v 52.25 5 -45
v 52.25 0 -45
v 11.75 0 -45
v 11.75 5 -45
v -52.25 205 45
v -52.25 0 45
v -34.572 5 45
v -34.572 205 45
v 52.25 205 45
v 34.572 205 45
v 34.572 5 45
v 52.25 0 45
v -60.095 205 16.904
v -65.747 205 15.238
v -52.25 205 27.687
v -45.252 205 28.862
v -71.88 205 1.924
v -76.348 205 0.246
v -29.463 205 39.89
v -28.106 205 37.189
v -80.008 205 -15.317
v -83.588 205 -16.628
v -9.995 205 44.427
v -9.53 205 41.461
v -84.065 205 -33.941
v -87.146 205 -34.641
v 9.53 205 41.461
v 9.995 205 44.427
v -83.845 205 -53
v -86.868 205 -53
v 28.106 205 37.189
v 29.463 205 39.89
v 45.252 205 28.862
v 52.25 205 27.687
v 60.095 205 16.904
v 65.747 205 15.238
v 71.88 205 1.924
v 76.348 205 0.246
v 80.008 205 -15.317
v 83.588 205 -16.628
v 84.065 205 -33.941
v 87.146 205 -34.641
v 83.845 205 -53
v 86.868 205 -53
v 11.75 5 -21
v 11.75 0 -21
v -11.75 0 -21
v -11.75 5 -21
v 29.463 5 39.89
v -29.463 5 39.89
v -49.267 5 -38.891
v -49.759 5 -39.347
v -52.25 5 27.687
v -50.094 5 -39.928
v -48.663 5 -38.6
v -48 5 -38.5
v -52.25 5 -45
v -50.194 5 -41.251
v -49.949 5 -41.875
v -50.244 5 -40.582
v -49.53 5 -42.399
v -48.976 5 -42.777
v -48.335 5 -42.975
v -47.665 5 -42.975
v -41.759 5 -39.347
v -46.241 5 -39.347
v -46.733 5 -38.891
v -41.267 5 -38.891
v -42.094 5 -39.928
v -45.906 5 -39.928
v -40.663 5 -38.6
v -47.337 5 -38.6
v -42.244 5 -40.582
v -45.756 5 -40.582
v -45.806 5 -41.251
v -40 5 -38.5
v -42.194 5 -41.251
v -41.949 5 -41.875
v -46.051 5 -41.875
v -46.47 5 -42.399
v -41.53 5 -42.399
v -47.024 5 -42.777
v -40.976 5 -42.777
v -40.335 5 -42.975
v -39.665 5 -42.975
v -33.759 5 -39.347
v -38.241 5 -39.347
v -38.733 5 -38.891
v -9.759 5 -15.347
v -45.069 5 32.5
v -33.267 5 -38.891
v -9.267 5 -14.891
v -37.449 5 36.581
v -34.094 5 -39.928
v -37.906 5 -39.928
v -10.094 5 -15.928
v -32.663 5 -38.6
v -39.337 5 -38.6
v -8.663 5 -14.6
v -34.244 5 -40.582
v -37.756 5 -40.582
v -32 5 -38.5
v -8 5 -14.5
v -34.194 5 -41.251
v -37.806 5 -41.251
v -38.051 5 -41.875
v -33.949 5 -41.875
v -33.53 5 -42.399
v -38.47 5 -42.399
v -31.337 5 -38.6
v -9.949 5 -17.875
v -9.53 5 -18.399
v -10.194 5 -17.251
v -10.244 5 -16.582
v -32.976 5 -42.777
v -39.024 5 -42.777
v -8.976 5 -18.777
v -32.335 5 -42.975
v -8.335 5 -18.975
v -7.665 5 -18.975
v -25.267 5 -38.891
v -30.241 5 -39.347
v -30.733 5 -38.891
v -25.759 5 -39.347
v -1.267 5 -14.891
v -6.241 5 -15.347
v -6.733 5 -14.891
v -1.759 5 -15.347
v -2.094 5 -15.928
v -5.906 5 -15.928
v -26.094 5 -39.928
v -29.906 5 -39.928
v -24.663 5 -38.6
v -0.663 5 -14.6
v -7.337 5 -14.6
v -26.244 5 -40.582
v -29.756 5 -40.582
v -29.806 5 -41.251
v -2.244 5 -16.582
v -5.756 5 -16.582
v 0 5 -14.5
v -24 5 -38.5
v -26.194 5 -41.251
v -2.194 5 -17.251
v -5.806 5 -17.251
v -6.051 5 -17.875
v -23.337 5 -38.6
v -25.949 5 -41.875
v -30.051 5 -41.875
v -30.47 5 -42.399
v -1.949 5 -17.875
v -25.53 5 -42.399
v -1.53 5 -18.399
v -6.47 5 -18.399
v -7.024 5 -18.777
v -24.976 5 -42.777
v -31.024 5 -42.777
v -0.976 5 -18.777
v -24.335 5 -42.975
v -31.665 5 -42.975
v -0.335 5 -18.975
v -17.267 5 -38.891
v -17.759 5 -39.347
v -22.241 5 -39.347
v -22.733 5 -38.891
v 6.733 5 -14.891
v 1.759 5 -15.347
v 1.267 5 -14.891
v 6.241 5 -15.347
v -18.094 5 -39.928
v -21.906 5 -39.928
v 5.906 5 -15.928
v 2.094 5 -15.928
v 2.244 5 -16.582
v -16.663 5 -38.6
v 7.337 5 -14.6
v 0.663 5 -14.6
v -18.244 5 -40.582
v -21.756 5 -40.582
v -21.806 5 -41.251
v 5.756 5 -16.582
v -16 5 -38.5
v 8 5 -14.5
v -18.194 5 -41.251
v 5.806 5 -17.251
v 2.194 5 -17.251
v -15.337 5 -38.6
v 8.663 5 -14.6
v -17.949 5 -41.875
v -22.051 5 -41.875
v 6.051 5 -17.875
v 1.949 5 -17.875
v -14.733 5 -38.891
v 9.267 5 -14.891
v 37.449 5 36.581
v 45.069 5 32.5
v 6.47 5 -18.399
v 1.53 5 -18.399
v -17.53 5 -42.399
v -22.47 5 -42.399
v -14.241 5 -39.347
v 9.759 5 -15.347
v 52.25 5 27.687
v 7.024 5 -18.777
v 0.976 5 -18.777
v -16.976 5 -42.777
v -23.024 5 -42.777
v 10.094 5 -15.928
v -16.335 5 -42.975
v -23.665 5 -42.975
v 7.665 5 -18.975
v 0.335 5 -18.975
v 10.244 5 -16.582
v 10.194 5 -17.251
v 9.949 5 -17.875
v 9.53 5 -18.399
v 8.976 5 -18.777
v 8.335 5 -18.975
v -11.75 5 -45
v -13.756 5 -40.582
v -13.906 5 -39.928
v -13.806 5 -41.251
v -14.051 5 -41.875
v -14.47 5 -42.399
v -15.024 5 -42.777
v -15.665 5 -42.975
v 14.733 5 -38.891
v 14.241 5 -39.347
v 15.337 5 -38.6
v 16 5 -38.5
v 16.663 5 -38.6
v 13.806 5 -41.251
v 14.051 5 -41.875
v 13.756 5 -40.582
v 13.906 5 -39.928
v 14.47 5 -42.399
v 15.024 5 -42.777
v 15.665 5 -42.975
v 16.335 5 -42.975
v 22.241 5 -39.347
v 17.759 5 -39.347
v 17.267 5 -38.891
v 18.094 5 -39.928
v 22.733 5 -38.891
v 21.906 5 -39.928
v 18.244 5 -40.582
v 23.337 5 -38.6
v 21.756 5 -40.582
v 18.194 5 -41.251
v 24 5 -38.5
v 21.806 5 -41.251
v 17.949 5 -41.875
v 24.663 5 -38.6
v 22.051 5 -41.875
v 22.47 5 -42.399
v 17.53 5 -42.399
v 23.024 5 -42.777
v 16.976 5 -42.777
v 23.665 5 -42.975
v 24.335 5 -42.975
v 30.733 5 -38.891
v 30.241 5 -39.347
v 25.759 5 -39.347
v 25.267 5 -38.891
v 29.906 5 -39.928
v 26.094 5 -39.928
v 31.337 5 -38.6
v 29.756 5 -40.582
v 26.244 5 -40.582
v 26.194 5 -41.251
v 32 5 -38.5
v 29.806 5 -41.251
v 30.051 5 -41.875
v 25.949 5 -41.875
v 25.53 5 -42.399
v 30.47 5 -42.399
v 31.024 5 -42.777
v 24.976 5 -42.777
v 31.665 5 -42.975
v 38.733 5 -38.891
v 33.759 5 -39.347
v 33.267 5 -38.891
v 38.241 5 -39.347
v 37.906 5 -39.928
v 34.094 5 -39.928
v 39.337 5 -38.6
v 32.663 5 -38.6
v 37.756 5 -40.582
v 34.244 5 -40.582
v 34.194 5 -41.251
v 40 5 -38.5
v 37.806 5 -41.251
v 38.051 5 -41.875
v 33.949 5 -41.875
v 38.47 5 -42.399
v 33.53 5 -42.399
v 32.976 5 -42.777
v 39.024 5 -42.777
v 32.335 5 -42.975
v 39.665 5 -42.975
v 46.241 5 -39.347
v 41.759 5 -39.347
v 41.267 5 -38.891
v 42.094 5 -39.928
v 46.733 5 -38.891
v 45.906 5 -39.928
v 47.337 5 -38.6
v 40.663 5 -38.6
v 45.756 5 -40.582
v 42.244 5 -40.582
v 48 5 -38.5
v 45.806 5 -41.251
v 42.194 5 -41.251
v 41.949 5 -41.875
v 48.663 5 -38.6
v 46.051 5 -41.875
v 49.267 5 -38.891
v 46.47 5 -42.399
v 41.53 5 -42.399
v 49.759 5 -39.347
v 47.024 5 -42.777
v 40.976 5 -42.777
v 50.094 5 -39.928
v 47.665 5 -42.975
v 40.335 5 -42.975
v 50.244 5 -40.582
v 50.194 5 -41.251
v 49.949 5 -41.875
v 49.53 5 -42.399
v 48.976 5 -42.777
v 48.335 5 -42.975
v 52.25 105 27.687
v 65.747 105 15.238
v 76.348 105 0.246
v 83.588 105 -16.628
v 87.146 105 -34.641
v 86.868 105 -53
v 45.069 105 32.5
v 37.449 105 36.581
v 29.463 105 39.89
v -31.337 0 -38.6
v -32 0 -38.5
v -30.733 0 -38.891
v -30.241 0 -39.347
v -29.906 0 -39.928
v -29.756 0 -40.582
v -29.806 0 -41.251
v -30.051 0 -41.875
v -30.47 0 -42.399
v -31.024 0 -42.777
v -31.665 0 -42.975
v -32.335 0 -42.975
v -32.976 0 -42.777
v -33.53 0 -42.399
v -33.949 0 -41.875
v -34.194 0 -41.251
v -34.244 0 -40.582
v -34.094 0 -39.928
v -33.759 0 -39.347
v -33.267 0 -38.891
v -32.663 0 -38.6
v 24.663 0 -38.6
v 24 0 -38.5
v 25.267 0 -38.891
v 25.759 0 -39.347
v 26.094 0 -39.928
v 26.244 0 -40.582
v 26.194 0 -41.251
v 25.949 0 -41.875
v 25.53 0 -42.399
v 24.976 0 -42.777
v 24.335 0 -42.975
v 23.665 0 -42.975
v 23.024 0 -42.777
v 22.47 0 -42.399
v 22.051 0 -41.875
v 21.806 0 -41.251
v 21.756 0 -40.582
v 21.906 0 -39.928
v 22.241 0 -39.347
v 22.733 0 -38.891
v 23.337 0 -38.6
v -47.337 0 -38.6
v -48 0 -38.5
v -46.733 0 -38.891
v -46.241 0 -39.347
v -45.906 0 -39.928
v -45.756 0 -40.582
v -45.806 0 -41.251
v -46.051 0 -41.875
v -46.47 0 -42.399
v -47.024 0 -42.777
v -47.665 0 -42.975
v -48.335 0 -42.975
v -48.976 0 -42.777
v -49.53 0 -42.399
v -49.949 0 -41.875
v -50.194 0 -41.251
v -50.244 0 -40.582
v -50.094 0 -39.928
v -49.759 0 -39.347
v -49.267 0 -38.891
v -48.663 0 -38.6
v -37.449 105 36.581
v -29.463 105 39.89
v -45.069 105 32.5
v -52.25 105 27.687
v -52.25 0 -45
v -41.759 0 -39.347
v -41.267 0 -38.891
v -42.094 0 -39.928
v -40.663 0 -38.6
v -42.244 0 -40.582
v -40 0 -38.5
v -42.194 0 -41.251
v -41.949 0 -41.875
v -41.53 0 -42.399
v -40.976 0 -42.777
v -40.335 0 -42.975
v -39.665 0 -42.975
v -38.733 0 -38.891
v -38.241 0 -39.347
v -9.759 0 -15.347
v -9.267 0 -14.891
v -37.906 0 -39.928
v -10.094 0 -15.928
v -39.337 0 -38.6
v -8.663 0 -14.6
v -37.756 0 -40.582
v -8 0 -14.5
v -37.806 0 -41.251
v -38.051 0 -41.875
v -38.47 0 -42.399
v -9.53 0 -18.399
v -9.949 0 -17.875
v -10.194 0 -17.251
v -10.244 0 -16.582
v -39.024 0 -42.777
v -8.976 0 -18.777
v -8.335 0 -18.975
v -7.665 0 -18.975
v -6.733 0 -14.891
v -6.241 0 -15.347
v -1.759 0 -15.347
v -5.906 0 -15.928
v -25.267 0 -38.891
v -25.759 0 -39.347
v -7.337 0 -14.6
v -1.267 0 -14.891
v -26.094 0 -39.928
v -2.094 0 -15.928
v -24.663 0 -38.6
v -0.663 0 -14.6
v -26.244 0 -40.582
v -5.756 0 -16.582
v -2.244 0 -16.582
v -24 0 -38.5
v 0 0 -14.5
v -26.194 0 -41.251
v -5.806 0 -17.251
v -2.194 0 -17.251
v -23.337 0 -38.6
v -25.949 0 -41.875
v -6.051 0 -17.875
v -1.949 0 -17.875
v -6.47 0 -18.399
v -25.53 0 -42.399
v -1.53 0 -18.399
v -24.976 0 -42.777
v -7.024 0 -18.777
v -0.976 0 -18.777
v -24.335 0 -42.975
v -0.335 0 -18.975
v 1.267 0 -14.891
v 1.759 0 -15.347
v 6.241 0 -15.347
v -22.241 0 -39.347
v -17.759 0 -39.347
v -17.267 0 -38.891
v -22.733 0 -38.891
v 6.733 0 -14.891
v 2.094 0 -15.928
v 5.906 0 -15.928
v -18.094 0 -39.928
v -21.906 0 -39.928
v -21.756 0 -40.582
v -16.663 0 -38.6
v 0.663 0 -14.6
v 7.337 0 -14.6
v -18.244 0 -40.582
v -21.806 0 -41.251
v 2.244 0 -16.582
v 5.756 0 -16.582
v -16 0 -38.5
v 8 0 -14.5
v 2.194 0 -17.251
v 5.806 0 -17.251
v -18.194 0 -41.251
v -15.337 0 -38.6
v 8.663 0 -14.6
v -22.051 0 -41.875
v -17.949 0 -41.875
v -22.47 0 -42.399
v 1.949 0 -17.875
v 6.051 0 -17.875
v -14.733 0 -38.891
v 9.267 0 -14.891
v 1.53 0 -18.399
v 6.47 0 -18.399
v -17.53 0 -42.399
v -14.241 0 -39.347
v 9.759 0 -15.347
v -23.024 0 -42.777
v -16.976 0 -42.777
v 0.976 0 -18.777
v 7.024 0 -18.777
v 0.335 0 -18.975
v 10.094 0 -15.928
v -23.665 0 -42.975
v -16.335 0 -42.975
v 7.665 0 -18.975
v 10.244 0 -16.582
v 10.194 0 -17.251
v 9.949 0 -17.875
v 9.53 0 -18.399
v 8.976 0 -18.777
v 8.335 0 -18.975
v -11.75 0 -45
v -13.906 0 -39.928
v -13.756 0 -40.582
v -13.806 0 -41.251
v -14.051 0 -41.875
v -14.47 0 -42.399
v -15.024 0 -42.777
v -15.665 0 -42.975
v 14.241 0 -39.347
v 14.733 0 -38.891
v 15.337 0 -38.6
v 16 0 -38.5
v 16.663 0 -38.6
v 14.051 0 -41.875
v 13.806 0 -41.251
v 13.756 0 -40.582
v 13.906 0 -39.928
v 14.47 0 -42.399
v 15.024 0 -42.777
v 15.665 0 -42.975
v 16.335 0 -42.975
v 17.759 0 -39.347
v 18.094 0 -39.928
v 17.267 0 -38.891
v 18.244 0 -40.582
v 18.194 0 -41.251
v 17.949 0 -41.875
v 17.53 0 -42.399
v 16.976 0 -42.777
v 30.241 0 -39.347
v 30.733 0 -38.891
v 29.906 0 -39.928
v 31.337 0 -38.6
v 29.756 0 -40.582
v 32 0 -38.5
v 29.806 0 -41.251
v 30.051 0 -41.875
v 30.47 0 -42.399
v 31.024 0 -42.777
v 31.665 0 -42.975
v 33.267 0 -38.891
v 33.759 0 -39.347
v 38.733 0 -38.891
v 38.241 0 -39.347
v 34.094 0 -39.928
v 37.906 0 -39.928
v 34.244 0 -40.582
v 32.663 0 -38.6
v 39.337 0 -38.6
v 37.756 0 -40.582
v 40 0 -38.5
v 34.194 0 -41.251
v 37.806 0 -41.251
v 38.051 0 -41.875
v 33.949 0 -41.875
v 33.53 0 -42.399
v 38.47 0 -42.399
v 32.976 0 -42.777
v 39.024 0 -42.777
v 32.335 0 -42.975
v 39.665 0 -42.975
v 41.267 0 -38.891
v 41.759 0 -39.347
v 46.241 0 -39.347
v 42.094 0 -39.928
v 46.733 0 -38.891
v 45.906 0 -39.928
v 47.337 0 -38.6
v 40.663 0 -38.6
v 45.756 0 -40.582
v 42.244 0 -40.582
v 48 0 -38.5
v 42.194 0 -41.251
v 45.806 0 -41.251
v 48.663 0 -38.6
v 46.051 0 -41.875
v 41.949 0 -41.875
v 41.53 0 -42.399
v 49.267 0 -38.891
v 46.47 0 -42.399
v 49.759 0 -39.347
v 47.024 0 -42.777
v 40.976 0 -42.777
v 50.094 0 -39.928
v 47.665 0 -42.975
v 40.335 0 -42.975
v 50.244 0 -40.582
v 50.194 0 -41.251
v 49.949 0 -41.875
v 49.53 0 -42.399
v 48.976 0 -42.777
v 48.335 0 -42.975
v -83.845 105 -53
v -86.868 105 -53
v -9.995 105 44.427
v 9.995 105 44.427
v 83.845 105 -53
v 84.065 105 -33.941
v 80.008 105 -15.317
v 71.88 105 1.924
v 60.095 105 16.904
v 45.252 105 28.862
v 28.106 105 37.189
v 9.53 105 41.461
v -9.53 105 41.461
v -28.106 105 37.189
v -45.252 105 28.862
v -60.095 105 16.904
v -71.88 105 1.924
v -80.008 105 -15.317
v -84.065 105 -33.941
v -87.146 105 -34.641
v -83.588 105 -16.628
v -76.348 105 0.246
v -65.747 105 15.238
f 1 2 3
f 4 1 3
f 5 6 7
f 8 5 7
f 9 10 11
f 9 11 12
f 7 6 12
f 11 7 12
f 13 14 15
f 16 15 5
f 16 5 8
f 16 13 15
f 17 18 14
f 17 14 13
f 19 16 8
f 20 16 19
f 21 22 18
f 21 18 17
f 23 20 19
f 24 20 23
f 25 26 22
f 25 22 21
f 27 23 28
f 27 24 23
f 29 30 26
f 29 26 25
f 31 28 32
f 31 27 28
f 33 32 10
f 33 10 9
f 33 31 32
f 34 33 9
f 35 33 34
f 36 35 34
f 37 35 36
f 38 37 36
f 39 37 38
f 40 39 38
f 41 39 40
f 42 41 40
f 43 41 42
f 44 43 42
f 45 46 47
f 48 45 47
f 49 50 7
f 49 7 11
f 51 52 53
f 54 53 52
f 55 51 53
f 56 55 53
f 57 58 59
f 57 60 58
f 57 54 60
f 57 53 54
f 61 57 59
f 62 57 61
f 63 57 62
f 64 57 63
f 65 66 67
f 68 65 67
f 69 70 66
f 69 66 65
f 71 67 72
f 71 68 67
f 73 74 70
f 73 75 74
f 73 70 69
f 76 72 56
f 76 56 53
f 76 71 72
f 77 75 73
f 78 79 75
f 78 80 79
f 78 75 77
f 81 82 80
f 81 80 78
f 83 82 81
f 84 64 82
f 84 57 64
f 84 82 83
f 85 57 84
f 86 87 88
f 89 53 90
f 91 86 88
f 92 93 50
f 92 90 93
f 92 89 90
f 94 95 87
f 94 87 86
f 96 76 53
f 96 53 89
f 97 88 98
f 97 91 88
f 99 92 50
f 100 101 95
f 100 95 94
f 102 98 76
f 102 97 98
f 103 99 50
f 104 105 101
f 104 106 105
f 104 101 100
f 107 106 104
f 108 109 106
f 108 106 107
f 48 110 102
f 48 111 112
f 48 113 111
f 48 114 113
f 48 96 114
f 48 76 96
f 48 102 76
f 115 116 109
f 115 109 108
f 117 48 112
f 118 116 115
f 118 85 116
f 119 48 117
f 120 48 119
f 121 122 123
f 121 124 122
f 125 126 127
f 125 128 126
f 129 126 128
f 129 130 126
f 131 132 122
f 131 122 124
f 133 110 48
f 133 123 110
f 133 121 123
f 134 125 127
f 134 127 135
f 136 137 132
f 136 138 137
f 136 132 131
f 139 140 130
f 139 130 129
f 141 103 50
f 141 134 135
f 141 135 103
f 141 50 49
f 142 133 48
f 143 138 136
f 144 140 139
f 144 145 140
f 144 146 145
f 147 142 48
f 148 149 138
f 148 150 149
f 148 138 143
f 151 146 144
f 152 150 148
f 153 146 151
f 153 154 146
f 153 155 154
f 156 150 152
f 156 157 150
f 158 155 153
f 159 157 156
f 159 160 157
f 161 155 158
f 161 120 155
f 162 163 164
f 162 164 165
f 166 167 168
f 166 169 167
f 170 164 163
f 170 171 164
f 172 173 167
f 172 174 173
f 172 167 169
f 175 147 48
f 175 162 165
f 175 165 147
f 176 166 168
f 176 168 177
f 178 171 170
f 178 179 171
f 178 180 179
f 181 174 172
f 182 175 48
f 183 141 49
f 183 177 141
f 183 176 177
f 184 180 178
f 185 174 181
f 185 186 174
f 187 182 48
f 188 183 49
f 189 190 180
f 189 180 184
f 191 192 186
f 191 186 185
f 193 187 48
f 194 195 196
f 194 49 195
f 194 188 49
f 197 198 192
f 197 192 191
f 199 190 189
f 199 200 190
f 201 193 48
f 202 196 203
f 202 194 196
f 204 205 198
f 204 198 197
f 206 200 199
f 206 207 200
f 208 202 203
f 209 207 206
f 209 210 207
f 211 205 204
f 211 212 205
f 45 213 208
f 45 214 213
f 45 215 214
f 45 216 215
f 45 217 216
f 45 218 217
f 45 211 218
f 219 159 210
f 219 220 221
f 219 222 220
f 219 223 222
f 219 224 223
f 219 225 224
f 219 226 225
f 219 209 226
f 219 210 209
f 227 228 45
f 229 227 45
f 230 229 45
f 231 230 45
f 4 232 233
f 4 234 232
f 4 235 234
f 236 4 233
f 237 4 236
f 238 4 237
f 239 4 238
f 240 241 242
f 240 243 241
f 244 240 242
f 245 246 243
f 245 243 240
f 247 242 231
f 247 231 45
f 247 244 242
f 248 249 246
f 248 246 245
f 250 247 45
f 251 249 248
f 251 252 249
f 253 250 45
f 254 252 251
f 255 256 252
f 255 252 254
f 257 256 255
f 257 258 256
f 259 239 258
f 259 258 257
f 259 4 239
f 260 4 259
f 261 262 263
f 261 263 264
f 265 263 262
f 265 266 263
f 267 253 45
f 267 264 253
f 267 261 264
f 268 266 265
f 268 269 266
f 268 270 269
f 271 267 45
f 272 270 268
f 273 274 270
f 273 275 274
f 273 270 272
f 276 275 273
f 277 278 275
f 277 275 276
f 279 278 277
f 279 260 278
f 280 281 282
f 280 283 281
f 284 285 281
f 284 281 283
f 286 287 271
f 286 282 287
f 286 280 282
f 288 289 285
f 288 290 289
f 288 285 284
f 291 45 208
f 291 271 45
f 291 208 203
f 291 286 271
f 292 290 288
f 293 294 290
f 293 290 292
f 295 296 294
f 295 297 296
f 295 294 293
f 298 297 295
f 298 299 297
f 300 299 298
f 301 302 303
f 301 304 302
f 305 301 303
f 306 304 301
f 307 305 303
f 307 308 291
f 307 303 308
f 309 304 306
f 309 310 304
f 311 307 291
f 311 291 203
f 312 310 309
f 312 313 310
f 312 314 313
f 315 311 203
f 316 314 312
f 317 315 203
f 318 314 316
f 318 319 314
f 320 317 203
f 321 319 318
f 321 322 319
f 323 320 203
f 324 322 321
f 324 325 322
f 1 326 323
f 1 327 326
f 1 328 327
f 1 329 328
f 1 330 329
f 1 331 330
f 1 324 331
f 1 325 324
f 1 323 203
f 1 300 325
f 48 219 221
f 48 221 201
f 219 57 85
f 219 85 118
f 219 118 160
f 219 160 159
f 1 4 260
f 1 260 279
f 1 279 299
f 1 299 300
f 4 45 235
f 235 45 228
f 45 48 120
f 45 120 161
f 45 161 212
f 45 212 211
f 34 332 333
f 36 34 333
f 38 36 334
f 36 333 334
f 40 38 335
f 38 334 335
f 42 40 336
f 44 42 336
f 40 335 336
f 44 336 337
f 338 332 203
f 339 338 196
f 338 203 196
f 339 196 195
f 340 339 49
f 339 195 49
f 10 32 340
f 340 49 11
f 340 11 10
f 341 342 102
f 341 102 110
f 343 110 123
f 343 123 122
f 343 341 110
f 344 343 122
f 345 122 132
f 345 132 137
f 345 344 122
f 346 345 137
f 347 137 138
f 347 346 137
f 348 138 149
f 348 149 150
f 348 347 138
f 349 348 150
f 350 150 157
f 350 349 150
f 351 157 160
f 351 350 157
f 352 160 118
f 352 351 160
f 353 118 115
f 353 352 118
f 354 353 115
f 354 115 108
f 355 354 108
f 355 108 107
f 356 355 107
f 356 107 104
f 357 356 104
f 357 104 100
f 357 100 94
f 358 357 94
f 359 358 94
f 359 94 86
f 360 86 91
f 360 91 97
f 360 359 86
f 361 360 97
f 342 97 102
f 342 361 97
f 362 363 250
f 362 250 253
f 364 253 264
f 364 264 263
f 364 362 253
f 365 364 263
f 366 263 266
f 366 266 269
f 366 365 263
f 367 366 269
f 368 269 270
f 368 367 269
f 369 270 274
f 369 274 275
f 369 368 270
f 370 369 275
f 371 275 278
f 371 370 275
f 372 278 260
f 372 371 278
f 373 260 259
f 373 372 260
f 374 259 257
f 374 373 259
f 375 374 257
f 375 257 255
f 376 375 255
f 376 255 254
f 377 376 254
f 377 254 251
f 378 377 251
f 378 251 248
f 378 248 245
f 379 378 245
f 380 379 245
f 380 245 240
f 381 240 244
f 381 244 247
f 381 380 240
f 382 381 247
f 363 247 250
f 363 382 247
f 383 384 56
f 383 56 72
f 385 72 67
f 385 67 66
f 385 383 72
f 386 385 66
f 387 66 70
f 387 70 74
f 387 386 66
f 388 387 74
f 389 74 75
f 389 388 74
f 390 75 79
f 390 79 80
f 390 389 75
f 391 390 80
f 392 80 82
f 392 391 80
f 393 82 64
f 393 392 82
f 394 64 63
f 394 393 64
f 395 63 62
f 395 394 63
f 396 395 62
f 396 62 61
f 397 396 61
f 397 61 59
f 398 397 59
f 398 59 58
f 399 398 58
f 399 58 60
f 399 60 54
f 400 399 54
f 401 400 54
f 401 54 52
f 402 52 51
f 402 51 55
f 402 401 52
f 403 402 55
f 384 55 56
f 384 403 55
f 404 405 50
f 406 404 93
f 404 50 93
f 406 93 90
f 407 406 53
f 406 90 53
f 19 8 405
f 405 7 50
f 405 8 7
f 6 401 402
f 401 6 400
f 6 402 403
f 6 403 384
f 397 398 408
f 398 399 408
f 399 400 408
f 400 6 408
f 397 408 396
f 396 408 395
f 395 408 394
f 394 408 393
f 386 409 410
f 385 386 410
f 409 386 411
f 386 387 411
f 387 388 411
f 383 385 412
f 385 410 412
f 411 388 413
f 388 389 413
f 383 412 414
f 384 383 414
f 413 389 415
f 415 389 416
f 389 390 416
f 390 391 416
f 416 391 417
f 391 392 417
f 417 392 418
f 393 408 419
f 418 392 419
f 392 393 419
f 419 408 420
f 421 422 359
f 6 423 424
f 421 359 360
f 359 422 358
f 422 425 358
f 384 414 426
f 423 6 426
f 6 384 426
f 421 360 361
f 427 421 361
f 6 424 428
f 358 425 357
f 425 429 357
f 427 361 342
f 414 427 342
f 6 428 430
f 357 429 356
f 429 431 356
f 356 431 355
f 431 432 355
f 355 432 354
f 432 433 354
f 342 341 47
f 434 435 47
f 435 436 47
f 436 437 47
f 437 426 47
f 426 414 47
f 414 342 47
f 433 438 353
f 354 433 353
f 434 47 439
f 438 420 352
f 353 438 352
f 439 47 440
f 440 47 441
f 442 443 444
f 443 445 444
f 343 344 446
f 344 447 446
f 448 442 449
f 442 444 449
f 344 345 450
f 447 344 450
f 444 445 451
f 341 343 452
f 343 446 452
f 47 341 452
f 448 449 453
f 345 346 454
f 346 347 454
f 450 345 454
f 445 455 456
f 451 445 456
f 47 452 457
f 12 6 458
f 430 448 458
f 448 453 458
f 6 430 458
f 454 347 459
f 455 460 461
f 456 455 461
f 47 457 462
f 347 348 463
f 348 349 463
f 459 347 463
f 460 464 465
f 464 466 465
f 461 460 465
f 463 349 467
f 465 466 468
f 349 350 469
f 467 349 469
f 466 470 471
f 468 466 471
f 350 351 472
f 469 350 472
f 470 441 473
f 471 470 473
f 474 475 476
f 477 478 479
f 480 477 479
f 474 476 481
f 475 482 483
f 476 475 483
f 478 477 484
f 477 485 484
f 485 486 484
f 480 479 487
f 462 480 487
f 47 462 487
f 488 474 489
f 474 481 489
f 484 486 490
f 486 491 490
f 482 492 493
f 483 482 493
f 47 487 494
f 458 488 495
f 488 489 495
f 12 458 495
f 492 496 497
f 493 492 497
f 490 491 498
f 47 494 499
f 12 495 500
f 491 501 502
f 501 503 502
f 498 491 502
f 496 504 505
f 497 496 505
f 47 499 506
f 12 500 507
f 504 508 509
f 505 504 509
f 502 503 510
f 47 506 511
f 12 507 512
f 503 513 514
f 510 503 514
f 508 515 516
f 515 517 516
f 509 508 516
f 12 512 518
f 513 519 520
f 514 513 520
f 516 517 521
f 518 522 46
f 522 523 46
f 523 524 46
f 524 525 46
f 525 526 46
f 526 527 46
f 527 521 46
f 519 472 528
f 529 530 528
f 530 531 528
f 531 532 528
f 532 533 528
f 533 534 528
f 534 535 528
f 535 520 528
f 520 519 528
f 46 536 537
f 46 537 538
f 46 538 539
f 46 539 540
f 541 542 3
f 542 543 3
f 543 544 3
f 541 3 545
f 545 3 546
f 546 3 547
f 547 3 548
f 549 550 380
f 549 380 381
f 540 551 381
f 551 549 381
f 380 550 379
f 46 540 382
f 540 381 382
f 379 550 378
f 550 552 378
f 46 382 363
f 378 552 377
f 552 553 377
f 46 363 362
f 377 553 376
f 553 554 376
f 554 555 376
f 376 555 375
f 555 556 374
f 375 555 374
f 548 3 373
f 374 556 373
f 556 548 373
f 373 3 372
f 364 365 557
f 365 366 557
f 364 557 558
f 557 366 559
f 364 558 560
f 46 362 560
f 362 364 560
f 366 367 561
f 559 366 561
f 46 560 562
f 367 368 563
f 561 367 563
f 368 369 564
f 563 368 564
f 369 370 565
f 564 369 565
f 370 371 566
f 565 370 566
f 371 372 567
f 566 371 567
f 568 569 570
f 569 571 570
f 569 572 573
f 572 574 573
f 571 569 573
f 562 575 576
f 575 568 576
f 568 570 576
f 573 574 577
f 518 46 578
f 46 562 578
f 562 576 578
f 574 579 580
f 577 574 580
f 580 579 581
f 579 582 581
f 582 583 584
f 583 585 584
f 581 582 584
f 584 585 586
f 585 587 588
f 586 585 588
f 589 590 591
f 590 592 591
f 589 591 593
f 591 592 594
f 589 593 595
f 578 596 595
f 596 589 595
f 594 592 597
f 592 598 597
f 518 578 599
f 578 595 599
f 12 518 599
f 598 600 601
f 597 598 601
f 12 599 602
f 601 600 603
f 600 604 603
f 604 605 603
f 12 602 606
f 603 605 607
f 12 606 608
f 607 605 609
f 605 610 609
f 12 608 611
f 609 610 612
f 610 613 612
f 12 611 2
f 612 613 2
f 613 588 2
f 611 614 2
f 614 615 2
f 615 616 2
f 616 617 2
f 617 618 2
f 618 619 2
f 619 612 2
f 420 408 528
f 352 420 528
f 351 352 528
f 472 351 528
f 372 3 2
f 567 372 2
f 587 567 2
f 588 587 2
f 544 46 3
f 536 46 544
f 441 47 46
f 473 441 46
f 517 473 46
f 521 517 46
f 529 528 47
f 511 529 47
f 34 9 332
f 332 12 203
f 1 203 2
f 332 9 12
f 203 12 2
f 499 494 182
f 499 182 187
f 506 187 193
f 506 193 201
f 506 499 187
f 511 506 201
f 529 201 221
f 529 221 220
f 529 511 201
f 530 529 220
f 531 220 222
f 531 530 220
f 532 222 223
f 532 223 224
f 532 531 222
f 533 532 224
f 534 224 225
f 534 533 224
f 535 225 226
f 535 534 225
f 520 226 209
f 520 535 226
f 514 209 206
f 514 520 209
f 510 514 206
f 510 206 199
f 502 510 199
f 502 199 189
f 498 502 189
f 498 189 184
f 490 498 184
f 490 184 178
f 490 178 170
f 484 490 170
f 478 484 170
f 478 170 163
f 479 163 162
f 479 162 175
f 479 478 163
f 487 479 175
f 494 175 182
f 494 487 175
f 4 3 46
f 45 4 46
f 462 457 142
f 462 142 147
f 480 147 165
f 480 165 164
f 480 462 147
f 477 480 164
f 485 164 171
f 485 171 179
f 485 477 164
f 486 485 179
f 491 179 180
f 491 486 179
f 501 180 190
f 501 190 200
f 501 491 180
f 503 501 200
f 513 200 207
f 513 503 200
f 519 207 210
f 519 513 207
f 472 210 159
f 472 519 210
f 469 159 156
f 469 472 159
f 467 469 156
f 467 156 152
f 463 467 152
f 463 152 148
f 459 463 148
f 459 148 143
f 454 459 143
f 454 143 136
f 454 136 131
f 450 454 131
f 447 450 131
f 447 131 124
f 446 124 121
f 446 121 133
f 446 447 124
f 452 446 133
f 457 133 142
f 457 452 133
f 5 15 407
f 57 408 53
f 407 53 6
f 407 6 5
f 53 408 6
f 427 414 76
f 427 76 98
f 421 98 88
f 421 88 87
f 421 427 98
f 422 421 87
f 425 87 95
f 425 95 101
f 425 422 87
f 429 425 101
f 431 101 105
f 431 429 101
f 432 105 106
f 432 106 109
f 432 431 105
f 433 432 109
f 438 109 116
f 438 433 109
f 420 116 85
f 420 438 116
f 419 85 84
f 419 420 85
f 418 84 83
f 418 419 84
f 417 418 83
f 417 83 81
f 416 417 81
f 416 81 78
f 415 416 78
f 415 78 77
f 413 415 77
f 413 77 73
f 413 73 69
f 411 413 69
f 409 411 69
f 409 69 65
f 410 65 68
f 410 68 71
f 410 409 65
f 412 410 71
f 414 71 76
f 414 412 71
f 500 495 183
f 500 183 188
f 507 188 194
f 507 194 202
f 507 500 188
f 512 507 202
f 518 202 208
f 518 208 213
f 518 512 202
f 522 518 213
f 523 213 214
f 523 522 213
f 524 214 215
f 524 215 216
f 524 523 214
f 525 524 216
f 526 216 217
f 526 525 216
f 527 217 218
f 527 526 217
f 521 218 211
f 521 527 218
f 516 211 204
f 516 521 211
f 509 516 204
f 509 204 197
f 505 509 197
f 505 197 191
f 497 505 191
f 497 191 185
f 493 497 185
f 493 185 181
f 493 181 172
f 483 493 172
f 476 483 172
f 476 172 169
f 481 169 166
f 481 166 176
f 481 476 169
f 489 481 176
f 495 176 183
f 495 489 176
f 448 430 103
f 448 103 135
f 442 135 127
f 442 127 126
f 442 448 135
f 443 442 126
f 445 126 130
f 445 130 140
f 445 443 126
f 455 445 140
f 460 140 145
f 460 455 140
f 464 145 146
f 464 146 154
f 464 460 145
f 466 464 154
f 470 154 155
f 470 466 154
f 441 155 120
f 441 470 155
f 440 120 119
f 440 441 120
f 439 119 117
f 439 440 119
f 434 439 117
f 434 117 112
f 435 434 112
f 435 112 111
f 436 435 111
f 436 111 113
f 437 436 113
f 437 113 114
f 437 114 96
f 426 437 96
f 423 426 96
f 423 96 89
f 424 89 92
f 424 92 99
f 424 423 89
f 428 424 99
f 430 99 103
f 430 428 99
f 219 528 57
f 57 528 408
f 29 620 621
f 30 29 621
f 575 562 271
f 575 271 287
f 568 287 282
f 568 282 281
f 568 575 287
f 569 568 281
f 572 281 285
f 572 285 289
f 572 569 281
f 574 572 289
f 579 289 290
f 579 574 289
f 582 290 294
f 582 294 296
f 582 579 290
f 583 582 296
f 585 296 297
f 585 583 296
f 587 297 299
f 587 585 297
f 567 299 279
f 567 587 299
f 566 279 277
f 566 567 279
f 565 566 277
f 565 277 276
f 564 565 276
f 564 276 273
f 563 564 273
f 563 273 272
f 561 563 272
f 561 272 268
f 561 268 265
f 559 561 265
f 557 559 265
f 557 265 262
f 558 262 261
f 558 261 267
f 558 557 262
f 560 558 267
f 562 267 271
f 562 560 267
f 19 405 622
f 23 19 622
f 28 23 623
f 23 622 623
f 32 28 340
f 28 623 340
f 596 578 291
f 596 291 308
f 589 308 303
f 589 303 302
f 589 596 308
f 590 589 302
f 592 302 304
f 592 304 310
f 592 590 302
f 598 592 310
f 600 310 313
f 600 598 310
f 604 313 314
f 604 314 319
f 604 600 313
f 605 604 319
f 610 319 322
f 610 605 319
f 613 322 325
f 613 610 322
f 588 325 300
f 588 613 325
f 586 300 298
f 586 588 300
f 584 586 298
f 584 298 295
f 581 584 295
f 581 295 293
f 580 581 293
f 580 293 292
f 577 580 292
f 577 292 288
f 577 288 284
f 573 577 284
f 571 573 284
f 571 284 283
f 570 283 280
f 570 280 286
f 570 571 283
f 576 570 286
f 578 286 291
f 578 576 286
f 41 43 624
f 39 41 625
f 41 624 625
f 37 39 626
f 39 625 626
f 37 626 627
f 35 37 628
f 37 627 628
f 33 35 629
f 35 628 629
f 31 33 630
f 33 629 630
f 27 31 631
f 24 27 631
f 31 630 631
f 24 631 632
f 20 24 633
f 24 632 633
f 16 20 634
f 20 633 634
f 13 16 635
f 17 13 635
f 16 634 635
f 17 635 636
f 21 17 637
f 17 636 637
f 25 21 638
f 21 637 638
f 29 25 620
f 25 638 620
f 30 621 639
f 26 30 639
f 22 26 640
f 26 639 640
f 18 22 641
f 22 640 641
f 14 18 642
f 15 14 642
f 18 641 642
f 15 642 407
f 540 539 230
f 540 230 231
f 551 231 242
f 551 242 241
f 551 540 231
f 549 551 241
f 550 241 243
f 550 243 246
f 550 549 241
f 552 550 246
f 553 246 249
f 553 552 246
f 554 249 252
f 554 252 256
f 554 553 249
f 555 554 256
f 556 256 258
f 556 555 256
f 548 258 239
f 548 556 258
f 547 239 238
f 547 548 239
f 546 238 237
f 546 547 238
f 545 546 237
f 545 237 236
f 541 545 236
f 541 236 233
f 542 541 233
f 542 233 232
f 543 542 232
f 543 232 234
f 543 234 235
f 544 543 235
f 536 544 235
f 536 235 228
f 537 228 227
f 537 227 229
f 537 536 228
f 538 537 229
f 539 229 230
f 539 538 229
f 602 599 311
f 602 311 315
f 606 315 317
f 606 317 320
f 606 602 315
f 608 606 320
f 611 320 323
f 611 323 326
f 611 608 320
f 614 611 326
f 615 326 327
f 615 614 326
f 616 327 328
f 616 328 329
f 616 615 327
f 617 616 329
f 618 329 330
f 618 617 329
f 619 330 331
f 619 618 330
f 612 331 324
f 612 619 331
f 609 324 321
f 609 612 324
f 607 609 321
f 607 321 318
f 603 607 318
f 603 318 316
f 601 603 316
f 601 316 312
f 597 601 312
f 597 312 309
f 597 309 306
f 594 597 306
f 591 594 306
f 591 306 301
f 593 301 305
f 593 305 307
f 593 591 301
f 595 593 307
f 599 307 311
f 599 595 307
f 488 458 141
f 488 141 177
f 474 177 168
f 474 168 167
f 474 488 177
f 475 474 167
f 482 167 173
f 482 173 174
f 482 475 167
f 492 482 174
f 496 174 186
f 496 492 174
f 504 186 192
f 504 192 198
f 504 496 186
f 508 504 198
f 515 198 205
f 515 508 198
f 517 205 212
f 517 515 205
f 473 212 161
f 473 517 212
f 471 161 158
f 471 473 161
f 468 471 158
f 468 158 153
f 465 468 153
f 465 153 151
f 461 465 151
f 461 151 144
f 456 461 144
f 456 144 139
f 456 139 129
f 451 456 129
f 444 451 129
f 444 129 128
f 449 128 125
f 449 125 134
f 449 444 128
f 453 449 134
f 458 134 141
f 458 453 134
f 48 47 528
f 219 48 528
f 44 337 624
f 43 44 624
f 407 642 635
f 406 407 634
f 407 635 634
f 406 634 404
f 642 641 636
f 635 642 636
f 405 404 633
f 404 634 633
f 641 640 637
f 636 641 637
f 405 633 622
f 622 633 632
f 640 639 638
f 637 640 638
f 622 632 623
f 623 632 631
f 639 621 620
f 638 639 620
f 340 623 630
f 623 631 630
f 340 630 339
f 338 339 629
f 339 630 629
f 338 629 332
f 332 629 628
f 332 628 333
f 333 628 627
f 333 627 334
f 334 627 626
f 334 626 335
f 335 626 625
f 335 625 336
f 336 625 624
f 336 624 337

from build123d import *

# Parameters (mm, degrees)
SKETCH_2_R      = 2.25
EXTRUDE_1_DEPTH = 5
EXTRUDE_5_DEPTH = 100
EXTRUDE_START   = 100
EXTRUDE_7_DEPTH = 100


with BuildPart() as part:
    # 草图2 → 凸台-拉伸1 (new body)
    with BuildSketch(Plane(origin=(0, 0, 0), x_dir=(1, 0, 0), z_dir=(0, 1, 0))):
        Polygon((-11.75, 45), (-52.25, 45), (-52.25, -45), (52.25, -45), (52.25, 45), (11.75, 45), (11.75, 21), (-11.75, 21), align=None)
        with Locations(Location((-8, 16.75, 0), (0, 0, 270))):
            Circle(SKETCH_2_R, mode=Mode.SUBTRACT)
        with Locations(Location((-48, 40.75, 0), (0, 0, 270))):
            Circle(SKETCH_2_R, mode=Mode.SUBTRACT)
        with Locations(Location((-40, 40.75, 0), (0, 0, 270))):
            Circle(SKETCH_2_R, mode=Mode.SUBTRACT)
        with Locations(Location((-32, 40.75, 0), (0, 0, 270))):
            Circle(SKETCH_2_R, mode=Mode.SUBTRACT)
        with Locations(Location((-24, 40.75, 0), (0, 0, 270))):
            Circle(SKETCH_2_R, mode=Mode.SUBTRACT)
        with Locations(Location((-16, 40.75, 0), (0, 0, 270))):
            Circle(SKETCH_2_R, mode=Mode.SUBTRACT)
        with Locations(Location((0, 16.75, 0), (0, 0, 270))):
            Circle(SKETCH_2_R, mode=Mode.SUBTRACT)
        with Locations(Location((8, 16.75, 0), (0, 0, 270))):
            Circle(SKETCH_2_R, mode=Mode.SUBTRACT)
        with Locations(Location((16, 40.75, 0), (0, 0, 270))):
            Circle(SKETCH_2_R, mode=Mode.SUBTRACT)
        with Locations(Location((24, 40.75, 0), (0, 0, 270))):
            Circle(SKETCH_2_R, mode=Mode.SUBTRACT)
        with Locations(Location((32, 40.75, 0), (0, 0, 270))):
            Circle(SKETCH_2_R, mode=Mode.SUBTRACT)
        with Locations(Location((40, 40.75, 0), (0, 0, 270))):
            Circle(SKETCH_2_R, mode=Mode.SUBTRACT)
        with Locations(Location((48, 40.75, 0), (0, 0, 270))):
            Circle(SKETCH_2_R, mode=Mode.SUBTRACT)
    extrude(amount=EXTRUDE_1_DEPTH)

    # 草图7 → 凸台-拉伸5 (add)
    with BuildSketch(Plane(origin=(0, 5, 5), x_dir=(1, 0, 0), z_dir=(0, 1, 0))):
        with BuildLine():
            ThreePointArc((-29.462817643, -34.890487173), (-41.309546241, -29.634761226), (-52.25, -22.686804315))
            Line((-52.25, -22.686804315), (-52.25, -40))
            Line((-52.25, -40), (-34.57233047, -40))
            Line((-34.57233047, -40), (-29.462817643, -34.890487173))
        make_face()
        with BuildLine():
            ThreePointArc((52.25, -22.686804315), (41.309546241, -29.634761226), (29.462817643, -34.890487173))
            Line((29.462817643, -34.890487173), (34.57233047, -40))
            Line((34.57233047, -40), (52.25, -40))
            Line((52.25, -40), (52.25, -22.686804315))
        make_face()
    extrude(amount=EXTRUDE_5_DEPTH)

    # 草图7<5> → 凸台-拉伸7 (add)
    with BuildSketch(Plane(origin=(0, 5, 5), x_dir=(1, 0, 0), z_dir=(0, 1, 0)).offset(EXTRUDE_START)):
        with BuildLine():
            Line((52.25, -40), (52.25, -22.686804315))
            ThreePointArc((52.25, -22.686804315), (80.411596121, 13.000359287), (86.867715522, 58))
            Line((86.867715522, 58), (83.845095265, 58))
            ThreePointArc((83.845095265, 58), (0, -37), (-83.845095265, 58))
            Line((-83.845095265, 58), (-86.867715522, 58))
            ThreePointArc((-86.867715522, 58), (-80.411596121, 13.000359287), (-52.25, -22.686804315))
            Line((-52.25, -22.686804315), (-52.25, -40))
            Line((-52.25, -40), (-34.57233047, -40))
            Line((-34.57233047, -40), (-29.462817643, -34.890487173))
            ThreePointArc((-29.462817643, -34.890487173), (0, -40), (29.462817643, -34.890487173))
            Line((29.462817643, -34.890487173), (34.57233047, -40))
            Line((34.57233047, -40), (52.25, -40))
        make_face()
    extrude(amount=EXTRUDE_7_DEPTH)


solid = part.part
